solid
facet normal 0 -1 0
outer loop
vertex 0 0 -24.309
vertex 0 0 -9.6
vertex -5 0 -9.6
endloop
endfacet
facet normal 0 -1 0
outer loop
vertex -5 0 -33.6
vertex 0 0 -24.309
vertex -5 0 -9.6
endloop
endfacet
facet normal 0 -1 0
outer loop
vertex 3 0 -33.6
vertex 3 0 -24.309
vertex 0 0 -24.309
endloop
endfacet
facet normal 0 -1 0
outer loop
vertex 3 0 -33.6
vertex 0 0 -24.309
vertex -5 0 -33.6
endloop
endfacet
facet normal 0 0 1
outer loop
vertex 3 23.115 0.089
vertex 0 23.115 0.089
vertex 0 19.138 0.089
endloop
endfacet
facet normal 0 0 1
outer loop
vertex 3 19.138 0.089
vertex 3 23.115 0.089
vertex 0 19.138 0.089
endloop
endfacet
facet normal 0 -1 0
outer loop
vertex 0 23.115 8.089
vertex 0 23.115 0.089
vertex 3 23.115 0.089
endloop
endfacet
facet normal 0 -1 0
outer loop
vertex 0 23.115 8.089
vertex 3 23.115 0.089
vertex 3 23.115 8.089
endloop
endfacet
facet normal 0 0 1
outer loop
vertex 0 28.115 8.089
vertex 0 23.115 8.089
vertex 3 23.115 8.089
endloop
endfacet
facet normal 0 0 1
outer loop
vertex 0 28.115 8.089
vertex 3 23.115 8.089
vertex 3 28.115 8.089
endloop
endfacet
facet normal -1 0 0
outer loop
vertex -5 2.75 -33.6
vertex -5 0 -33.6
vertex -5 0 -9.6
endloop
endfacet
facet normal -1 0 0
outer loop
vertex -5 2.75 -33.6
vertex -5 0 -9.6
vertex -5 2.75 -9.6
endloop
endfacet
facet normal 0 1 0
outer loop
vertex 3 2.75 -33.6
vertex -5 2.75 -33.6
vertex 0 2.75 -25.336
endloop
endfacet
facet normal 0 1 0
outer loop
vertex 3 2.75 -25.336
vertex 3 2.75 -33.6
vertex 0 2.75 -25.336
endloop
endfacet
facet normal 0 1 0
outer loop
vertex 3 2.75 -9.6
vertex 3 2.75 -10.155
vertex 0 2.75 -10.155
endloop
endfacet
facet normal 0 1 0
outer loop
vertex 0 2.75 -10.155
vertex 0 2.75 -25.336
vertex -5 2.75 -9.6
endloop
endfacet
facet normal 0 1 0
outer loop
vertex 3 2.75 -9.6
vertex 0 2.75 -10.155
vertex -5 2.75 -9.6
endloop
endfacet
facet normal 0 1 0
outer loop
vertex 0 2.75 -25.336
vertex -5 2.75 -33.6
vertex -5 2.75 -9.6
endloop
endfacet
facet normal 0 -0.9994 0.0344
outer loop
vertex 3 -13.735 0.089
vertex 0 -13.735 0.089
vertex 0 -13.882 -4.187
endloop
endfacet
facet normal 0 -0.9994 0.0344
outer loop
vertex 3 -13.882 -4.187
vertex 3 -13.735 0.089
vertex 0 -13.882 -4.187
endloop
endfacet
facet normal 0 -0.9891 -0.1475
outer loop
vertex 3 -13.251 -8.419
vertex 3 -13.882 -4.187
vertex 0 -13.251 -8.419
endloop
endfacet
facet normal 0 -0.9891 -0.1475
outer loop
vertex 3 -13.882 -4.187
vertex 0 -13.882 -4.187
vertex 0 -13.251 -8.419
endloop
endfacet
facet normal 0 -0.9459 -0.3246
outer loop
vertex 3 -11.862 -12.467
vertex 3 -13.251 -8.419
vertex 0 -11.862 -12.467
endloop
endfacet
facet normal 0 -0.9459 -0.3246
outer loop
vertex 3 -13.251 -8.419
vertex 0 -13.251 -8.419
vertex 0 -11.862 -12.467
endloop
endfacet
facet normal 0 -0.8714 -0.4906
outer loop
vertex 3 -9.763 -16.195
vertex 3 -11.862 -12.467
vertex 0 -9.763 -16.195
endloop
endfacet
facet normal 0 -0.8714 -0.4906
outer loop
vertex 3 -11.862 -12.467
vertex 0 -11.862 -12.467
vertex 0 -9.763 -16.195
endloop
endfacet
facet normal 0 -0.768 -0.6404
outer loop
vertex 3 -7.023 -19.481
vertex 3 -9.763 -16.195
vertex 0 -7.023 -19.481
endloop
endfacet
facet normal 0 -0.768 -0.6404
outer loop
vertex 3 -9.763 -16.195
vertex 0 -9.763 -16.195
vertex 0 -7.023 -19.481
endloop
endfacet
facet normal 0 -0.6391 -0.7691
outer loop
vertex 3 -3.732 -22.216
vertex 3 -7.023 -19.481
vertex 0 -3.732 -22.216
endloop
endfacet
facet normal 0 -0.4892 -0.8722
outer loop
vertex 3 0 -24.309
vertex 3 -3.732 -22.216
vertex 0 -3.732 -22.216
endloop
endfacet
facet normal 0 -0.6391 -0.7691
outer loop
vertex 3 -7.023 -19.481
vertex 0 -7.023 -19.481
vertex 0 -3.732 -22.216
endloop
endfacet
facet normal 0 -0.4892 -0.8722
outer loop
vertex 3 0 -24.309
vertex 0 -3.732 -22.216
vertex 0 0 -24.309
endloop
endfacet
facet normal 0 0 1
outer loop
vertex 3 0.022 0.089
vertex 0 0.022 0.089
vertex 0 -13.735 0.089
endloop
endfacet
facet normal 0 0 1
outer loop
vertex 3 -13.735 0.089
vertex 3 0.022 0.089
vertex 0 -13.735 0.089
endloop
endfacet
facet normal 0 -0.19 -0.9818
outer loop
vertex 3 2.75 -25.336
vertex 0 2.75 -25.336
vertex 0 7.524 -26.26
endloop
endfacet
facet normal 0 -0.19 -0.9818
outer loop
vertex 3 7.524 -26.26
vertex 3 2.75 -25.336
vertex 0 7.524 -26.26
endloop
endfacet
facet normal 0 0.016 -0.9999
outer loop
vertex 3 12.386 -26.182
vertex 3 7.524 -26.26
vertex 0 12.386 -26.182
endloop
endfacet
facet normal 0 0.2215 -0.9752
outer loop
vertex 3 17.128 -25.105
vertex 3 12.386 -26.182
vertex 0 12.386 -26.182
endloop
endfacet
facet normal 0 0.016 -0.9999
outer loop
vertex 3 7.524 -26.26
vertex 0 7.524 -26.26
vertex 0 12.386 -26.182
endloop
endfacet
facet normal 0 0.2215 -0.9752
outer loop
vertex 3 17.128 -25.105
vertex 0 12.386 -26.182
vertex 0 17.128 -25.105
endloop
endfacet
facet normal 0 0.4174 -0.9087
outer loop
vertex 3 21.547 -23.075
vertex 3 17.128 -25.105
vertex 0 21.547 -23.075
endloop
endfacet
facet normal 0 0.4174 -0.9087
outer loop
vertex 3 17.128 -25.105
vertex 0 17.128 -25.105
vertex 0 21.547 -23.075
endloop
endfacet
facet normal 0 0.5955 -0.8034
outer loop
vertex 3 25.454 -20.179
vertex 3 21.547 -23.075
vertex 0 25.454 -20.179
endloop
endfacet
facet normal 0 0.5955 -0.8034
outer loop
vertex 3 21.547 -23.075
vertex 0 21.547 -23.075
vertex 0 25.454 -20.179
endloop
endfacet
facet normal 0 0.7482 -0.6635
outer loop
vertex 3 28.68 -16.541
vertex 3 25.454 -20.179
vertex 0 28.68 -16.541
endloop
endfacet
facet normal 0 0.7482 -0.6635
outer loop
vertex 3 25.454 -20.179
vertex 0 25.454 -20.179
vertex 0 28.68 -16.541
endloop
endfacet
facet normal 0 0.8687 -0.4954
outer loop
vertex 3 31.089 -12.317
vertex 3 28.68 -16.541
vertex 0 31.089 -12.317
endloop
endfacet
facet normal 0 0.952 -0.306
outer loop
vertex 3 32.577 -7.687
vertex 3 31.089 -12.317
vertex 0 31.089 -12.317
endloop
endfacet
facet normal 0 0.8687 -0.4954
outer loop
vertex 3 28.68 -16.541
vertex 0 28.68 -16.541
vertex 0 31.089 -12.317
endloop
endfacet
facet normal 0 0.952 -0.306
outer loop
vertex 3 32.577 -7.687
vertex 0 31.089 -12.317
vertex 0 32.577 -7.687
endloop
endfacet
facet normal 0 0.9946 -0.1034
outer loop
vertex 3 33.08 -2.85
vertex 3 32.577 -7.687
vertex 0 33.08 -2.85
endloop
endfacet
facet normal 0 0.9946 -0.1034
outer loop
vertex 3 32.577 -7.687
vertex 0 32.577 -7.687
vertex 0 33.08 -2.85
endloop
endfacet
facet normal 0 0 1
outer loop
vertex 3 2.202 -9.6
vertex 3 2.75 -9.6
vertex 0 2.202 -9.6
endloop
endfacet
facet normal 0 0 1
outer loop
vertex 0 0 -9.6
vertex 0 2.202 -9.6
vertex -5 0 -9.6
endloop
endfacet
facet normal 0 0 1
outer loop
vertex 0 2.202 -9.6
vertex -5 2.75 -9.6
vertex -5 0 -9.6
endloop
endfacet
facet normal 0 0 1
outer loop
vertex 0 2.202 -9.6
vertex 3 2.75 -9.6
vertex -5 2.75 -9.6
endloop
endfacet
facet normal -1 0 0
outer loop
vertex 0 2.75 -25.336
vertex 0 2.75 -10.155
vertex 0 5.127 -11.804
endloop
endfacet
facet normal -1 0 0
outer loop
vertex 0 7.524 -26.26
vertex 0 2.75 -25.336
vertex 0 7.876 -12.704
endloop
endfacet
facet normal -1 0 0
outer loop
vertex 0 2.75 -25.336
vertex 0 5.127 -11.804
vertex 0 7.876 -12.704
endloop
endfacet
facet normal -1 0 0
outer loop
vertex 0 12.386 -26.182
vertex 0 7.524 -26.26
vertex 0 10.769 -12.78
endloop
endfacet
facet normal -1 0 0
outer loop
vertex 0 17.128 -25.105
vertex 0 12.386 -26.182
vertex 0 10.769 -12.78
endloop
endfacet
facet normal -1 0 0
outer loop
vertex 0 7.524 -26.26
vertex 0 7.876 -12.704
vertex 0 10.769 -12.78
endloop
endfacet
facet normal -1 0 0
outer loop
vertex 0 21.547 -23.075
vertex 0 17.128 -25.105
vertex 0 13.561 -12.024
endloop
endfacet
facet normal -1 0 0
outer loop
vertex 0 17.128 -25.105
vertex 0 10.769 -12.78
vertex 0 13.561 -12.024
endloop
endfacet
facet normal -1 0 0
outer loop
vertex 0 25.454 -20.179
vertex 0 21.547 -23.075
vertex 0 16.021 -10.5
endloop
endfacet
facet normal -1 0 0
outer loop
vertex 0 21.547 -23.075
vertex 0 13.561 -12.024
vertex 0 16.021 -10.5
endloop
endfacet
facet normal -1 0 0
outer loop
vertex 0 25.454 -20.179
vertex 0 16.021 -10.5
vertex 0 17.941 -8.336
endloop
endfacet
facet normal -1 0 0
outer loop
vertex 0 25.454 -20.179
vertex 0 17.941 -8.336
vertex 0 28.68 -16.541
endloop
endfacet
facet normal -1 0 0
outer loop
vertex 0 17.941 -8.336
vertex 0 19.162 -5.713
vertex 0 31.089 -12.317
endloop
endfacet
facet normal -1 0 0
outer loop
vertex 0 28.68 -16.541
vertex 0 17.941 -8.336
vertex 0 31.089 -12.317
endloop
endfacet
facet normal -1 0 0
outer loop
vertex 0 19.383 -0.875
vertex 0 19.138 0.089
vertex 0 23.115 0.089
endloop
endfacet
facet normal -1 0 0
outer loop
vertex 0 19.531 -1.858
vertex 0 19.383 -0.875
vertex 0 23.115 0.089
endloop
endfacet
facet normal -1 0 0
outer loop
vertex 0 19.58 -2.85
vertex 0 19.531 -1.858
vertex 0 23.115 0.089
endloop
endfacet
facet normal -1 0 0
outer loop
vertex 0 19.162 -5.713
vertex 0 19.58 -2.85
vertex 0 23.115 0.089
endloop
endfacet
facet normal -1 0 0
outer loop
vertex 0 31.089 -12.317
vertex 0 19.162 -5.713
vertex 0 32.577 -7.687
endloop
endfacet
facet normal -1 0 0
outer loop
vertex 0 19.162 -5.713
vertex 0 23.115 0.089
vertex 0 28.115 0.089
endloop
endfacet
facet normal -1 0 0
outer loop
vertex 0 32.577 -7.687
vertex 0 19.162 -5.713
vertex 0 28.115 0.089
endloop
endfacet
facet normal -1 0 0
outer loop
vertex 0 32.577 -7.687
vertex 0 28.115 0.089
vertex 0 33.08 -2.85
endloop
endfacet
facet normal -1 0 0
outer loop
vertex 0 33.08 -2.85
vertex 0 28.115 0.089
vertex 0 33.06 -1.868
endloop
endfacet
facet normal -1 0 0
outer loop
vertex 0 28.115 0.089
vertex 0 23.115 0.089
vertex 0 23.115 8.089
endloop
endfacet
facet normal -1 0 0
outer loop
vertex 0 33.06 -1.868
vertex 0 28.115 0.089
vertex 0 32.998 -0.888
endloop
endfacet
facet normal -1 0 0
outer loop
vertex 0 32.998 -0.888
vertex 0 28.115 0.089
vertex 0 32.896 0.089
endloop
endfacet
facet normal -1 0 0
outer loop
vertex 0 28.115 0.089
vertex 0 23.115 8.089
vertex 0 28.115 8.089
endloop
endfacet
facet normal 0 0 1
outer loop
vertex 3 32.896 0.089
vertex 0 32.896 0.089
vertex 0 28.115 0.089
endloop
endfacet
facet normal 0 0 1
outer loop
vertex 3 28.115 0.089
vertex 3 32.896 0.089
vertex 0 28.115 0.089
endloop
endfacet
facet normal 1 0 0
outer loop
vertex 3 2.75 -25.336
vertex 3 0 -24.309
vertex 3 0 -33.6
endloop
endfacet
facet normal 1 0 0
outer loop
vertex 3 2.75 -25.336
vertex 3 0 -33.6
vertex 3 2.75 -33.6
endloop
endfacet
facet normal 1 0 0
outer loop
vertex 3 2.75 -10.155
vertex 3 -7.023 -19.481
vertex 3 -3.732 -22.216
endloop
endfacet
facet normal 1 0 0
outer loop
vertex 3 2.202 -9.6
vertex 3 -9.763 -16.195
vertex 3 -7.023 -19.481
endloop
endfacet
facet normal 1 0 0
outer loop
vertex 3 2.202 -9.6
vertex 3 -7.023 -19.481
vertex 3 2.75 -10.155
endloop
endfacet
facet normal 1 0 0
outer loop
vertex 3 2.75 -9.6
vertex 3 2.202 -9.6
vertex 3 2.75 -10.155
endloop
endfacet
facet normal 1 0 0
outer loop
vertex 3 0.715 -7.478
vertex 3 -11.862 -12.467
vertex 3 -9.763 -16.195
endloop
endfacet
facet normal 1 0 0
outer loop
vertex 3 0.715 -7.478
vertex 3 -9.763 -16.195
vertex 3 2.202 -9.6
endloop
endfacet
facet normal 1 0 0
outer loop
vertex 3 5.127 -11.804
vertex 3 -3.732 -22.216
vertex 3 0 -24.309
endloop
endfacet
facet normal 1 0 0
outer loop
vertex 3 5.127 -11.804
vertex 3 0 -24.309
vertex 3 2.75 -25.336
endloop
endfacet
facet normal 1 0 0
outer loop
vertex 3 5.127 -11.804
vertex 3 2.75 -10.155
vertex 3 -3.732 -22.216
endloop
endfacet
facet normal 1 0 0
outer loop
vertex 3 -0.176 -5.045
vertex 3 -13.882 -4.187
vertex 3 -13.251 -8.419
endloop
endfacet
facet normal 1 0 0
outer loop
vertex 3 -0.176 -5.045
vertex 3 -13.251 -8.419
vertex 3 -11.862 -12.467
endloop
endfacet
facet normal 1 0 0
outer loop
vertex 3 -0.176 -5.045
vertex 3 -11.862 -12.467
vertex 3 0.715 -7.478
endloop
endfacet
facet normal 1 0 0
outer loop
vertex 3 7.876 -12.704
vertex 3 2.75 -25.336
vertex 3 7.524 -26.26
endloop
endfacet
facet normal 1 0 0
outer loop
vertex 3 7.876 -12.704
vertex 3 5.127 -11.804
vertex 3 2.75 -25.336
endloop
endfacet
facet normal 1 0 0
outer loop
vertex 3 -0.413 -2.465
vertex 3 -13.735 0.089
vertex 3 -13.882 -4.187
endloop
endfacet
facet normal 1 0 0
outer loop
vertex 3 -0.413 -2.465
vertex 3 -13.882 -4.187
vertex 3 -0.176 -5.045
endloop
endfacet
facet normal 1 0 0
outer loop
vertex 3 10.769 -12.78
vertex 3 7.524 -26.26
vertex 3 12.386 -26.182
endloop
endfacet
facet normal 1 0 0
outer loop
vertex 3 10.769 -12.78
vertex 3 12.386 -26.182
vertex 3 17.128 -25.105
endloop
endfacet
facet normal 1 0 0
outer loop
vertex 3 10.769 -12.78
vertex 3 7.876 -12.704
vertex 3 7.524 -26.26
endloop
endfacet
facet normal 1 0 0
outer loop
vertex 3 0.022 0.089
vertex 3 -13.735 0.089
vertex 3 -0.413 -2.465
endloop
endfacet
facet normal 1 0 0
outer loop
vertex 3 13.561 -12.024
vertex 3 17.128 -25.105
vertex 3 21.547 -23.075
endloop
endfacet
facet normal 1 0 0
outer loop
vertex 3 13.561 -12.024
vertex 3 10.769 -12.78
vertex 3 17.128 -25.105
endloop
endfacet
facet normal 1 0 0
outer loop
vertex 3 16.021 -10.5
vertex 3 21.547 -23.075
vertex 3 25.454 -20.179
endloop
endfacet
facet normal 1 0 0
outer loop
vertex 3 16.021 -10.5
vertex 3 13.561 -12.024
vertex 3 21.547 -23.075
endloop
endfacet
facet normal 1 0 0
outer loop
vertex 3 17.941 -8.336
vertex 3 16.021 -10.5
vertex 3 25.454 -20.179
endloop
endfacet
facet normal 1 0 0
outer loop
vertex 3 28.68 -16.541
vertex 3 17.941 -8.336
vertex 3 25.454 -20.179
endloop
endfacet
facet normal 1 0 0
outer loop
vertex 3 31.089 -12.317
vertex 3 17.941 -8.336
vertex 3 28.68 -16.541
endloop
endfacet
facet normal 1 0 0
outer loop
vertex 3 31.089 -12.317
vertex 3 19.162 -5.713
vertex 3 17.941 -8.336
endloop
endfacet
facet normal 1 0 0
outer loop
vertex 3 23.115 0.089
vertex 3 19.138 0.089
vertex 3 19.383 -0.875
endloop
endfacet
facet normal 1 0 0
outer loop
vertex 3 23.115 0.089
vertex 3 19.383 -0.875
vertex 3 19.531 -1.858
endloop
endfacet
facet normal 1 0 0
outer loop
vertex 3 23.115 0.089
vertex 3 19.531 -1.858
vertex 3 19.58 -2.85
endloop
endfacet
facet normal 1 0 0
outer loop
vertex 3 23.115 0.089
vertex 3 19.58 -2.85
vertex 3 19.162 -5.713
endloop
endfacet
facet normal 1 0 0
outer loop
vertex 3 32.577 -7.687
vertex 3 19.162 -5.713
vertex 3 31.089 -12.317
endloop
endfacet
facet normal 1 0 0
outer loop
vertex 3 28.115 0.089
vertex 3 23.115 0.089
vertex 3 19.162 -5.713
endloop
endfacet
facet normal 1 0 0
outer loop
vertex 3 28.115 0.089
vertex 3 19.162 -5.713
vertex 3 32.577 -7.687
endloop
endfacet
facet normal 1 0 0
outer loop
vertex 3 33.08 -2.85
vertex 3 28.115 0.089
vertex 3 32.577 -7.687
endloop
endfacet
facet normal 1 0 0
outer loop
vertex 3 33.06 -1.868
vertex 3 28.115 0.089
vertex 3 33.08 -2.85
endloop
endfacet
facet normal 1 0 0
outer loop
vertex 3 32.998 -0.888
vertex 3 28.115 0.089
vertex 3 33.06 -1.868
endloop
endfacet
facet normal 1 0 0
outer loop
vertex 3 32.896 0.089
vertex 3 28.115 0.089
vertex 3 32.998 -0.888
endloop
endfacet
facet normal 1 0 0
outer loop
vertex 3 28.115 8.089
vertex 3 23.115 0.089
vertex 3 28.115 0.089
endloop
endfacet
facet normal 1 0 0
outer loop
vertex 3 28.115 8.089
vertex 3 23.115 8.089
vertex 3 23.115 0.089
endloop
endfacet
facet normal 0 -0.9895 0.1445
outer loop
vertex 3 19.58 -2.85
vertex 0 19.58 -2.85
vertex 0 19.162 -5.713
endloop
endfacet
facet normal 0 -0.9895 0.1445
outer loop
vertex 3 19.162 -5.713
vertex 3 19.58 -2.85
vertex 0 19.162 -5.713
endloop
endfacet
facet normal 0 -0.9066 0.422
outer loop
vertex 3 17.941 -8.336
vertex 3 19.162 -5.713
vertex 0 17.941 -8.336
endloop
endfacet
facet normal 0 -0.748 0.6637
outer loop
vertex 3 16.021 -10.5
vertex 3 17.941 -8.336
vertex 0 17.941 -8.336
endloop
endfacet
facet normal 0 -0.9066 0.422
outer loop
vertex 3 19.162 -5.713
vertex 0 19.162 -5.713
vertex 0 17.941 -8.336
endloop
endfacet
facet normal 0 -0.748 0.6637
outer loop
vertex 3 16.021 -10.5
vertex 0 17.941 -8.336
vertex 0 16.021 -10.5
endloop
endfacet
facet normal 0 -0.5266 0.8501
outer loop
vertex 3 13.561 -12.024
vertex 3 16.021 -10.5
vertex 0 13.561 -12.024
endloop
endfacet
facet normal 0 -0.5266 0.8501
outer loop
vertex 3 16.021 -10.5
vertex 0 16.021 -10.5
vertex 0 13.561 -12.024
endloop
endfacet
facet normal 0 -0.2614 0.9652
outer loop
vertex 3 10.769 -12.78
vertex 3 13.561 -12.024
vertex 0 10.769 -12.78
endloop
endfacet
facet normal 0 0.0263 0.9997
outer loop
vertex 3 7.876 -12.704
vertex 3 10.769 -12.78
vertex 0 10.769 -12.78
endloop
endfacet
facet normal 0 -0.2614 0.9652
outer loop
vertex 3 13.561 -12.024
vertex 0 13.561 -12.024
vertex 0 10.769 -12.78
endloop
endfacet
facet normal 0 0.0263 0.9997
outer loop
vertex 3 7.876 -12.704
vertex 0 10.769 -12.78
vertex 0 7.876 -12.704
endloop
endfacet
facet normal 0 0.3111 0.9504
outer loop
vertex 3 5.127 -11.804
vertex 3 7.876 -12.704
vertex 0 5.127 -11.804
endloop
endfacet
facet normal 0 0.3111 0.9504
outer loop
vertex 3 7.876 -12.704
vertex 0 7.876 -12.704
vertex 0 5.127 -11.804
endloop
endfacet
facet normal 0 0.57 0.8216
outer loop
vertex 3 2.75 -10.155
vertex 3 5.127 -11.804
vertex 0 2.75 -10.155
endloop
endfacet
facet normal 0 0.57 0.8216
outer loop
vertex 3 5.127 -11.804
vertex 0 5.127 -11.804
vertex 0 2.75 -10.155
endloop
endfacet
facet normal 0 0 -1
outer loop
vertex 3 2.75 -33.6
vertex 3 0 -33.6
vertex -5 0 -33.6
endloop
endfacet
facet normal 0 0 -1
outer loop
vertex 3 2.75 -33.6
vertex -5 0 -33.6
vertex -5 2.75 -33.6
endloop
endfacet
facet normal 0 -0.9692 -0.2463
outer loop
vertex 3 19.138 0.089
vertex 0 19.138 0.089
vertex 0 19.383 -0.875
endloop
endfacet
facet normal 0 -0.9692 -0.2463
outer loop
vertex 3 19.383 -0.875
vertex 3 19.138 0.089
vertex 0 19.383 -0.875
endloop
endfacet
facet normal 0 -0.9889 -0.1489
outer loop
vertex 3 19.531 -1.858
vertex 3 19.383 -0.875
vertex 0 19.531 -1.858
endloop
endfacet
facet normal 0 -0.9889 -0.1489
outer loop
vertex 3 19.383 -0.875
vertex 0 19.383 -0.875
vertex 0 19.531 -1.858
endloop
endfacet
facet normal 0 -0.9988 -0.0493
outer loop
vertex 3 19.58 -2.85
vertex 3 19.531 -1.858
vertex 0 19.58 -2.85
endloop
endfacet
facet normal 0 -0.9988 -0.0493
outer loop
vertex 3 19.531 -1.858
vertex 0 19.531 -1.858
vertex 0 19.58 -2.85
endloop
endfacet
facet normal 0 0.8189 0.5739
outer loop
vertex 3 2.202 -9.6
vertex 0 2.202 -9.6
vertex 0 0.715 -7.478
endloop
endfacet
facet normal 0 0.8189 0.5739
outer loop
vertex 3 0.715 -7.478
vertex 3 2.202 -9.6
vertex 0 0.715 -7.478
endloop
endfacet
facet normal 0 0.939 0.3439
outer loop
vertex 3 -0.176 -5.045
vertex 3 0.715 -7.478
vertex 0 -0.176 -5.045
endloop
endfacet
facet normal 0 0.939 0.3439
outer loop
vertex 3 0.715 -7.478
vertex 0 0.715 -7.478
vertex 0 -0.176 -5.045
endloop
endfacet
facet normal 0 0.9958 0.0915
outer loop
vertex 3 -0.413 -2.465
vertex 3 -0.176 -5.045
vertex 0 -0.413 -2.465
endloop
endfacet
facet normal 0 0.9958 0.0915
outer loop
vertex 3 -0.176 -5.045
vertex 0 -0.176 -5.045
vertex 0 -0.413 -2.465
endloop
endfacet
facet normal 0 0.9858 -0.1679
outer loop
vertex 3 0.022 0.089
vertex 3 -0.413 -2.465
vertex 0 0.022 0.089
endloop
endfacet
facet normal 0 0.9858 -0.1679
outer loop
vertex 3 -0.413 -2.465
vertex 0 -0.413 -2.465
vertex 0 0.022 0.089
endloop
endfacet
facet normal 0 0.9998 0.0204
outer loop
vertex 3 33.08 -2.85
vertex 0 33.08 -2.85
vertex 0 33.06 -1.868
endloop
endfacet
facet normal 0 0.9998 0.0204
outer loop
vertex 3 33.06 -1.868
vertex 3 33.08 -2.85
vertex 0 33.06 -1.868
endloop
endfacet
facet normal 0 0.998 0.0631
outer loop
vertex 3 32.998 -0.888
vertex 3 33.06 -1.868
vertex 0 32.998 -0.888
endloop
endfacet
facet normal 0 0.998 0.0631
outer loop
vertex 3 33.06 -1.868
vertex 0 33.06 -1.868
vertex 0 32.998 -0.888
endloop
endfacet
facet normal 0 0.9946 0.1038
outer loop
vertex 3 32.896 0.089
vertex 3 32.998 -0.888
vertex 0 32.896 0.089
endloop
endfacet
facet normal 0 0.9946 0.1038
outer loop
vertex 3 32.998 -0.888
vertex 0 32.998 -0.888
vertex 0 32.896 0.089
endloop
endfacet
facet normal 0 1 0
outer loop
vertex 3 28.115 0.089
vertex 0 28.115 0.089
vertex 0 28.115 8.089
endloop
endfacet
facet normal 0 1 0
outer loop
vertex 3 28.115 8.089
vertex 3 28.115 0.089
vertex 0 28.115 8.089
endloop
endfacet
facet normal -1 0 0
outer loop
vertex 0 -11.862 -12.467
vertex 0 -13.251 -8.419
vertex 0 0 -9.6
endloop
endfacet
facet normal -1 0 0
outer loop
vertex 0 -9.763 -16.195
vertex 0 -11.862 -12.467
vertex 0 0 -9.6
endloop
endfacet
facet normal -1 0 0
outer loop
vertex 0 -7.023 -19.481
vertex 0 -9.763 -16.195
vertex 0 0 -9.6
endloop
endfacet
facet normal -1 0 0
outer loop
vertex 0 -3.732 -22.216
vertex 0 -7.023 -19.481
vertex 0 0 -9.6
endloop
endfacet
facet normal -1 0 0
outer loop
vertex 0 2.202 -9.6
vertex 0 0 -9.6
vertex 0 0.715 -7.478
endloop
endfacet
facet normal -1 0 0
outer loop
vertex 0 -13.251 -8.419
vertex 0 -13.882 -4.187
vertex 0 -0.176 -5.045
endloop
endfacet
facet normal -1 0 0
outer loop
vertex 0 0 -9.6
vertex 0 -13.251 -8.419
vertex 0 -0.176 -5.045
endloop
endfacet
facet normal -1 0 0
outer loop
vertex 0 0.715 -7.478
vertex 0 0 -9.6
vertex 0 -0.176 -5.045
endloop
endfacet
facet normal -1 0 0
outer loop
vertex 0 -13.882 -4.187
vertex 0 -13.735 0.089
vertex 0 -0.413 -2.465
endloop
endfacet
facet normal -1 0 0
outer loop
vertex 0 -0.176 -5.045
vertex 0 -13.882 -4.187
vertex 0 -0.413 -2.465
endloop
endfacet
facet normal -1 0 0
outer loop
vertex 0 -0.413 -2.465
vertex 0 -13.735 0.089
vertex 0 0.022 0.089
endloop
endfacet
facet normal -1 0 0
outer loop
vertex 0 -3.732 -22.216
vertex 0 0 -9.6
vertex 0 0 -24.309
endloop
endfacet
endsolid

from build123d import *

# Parameters (mm, degrees)
F3_W          = 5
F3_H          = 8
F4_DEPTH      = 3
F5_DEPTH      = 5
F5_DEPTH_BACK = 3


with BuildPart() as f4:
    # F3 (on Right) → F4 (new body)
    with BuildSketch(Plane.YZ):
        with BuildLine():
            ThreePointArc((19.1383222897, 0.0889776102), (19.469019625, -1.3642024736), (19.5800742792, -2.8503922149))
            ThreePointArc((19.5800742792, -2.8503922149), (13.5612334827, -12.023743369), (2.75, -10.1545064899))
            Line((2.75, -10.1545064899), (2.75, -25.3359450287))
            ThreePointArc((2.75, -25.3359450287), (23.5754887861, -21.7283786748), (33.0800742792, -2.8503922149))
            ThreePointArc((33.0800742792, -2.8503922149), (33.0338908423, -1.3778133128), (32.8955220559, 0.0889776102))
            Line((32.8955220559, 0.0889776102), (28.1147146076, 0.0889776102))
            Line((28.1147146076, 0.0889776102), (23.1147146076, 0.0889776102))
            Line((23.1147146076, 0.0889776102), (19.1383222897, 0.0889776102))
        make_face()
        with BuildLine():
            ThreePointArc((2.2018949322, -9.6003899574), (-0.1760316999, -5.0454767522), (0.0218262686, 0.0889776102))
            Line((0.0218262686, 0.0889776102), (-13.7353734976, 0.0889776102))
            ThreePointArc((-13.7353734976, 0.0889776102), (-10.8978226866, -14.3788672164), (0, -24.3090076597))
            Line((0, -24.3090076597), (0, -9.6003899574))
            Line((0, -9.6003899574), (2.2018949322, -9.6003899574))
        make_face()
        with BuildLine():
            Line((2.75, -25.3359450287), (2.75, -10.1545064899))
            ThreePointArc((2.75, -10.1545064899), (2.4705469349, -9.8827901659), (2.2018949322, -9.6003899574))
            Line((2.2018949322, -9.6003899574), (0, -9.6003899574))
            Line((0, -9.6003899574), (0, -24.3090076597))
            ThreePointArc((0, -24.3090076597), (1.3589494159, -24.8654576471), (2.75, -25.3359450287))
        make_face()
        with Locations((25.6147146076, 4.0889776102)):
            Rectangle(F3_W, F3_H)
    extrude(amount=F4_DEPTH)

    # F3 (on Right) → F5 (join, two sides)
    with BuildSketch(Plane.YZ) as f5_sk:
        with BuildLine():
            ThreePointArc((2.2018949322, -9.6003899574), (2.4705469349, -9.8827901659), (2.75, -10.1545064899))
            Line((2.75, -10.1545064899), (2.75, -9.6003899574))
            Line((2.75, -9.6003899574), (2.2018949322, -9.6003899574))
        make_face()
        with BuildLine():
            Line((2.75, -25.3359450287), (2.75, -10.1545064899))
            ThreePointArc((2.75, -10.1545064899), (2.4705469349, -9.8827901659), (2.2018949322, -9.6003899574))
            Line((2.2018949322, -9.6003899574), (0, -9.6003899574))
            Line((0, -9.6003899574), (0, -24.3090076597))
            ThreePointArc((0, -24.3090076597), (1.3589494159, -24.8654576471), (2.75, -25.3359450287))
        make_face()
        with BuildLine():
            Line((2.75, -33.6003899574), (2.75, -25.3359450287))
            ThreePointArc((2.75, -25.3359450287), (1.3589494159, -24.8654576471), (0, -24.3090076597))
            Line((0, -24.3090076597), (0, -33.6003899574))
            Line((0, -33.6003899574), (2.75, -33.6003899574))
        make_face()
    extrude(amount=-F5_DEPTH)
    extrude(f5_sk.sketch, amount=F5_DEPTH_BACK)


solid = f4.part
